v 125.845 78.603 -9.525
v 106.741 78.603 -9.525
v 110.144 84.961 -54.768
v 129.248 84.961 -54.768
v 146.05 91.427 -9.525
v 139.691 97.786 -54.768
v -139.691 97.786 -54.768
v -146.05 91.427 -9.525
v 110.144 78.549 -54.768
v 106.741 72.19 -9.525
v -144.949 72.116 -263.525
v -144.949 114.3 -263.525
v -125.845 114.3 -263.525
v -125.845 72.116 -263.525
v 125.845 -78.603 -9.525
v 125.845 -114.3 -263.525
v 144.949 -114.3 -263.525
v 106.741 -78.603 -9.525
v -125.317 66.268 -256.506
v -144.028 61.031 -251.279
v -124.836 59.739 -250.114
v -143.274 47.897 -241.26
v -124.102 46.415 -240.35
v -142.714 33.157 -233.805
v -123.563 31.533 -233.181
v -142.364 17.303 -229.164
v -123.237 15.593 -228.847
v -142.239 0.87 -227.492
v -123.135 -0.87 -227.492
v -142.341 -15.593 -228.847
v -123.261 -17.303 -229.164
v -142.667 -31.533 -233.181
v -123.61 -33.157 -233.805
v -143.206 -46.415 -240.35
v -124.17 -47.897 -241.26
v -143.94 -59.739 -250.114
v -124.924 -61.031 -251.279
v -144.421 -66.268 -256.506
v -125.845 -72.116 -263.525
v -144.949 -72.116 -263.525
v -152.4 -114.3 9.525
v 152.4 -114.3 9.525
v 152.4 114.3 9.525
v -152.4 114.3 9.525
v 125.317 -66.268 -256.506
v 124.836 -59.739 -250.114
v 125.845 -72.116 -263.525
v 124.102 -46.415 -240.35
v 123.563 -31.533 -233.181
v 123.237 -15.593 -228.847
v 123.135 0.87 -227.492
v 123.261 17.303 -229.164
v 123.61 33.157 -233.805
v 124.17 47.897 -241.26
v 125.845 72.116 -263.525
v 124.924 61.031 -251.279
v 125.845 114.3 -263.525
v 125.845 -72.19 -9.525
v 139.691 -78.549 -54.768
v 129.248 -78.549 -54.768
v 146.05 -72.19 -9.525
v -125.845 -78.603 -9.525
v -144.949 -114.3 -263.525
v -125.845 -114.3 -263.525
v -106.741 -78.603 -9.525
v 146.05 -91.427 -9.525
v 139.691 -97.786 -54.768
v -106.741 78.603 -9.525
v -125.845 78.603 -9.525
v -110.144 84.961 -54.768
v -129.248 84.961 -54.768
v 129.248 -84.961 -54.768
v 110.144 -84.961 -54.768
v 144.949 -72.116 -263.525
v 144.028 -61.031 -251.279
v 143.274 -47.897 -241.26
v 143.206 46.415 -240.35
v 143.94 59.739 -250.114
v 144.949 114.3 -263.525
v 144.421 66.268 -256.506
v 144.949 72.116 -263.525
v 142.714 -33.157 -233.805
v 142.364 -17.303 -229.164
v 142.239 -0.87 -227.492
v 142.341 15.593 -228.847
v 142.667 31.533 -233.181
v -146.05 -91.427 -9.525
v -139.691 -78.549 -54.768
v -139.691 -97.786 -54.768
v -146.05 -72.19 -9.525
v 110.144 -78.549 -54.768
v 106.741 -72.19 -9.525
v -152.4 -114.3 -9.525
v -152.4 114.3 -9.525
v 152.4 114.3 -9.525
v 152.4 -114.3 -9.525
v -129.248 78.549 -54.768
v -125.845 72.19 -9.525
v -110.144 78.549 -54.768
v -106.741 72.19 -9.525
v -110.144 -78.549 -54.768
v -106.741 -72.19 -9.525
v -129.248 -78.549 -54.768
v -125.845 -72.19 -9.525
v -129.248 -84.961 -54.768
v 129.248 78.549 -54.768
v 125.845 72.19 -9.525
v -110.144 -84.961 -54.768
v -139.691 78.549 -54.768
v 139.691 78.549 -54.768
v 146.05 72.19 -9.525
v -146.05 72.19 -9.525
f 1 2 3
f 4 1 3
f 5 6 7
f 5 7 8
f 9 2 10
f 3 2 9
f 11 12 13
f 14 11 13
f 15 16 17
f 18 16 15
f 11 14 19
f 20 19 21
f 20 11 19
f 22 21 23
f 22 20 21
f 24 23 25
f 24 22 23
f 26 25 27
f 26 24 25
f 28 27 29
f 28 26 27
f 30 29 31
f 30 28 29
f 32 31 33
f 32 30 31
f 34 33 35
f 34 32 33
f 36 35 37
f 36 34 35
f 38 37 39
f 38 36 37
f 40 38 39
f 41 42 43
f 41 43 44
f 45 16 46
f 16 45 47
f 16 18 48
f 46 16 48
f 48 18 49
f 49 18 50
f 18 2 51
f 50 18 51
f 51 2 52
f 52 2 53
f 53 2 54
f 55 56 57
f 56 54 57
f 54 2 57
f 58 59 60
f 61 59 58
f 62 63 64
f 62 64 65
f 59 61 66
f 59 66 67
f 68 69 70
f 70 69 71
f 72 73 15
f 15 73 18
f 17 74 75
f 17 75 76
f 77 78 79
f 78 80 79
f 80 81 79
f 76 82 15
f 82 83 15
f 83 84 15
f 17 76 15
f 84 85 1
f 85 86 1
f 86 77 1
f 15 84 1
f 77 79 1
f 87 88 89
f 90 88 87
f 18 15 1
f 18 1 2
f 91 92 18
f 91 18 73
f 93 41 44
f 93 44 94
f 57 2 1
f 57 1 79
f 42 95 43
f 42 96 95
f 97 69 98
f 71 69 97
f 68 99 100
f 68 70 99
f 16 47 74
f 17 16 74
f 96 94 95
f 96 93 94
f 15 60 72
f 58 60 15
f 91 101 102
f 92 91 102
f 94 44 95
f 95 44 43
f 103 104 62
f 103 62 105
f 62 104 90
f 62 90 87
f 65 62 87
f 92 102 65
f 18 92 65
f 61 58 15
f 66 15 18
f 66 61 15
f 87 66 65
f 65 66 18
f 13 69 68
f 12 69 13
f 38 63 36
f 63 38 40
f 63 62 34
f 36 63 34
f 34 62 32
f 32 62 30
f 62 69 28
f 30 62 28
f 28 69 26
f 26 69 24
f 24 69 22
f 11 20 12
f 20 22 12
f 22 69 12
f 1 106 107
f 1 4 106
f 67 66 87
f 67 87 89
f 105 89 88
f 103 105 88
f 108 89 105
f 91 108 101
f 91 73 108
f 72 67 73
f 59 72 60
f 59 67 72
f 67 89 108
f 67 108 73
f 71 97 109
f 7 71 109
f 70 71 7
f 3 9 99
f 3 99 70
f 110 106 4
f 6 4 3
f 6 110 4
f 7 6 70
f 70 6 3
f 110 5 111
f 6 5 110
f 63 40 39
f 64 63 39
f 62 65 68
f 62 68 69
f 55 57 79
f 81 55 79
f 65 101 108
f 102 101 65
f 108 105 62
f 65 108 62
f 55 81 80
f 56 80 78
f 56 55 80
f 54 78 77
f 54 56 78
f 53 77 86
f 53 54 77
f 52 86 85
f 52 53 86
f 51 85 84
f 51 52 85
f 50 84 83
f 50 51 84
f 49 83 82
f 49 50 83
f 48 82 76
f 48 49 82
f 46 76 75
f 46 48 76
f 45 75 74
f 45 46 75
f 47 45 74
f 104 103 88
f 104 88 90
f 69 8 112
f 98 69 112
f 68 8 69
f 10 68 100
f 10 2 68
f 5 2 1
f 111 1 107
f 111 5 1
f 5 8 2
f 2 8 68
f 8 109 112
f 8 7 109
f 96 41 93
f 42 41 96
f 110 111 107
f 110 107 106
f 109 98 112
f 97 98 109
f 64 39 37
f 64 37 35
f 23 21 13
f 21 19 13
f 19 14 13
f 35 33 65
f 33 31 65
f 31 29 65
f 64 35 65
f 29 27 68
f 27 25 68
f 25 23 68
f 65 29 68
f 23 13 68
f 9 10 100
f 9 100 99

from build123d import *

# Parameters (mm, degrees)
F1_DEPTH      = 114.3
F2_DEPTH      = 114.3
F2_DEPTH_BACK = 114.3
F4_DEPTH      = 152.401
F4_DEPTH_BACK = 152.401
F6_DEPTH      = 152.4
F6_DEPTH_BACK = 152.4
F7_DEPTH      = 114.3010000004
F7_DEPTH_BACK = 114.3010000004


with BuildPart() as f1:
    # F0 (on Front) → F1 (new body, symmetric)
    with BuildSketch(Plane.XZ):
        Polygon((152.4, -9.525), (152.4, 9.525), (-152.4, 9.525), (-152.4, -9.525), (-146.05, -9.525), (-125.8450143232, -9.525), (-106.7412091007, -9.525), (106.7412091007, -9.525), (125.8450143232, -9.525), (146.05, -9.525), align=None)
    extrude(amount=F1_DEPTH, both=True)


with BuildPart() as f2:
    # F0 (on Front) → F2 (new body, two sides)
    with BuildSketch(Plane.XZ) as f2_sk:
        Polygon((144.9488195456, -263.525), (129.8880271086, -63.2800103521), (110.7842218861, -63.2800103521), (125.8450143232, -263.525), align=None)
        Polygon((129.8880271086, -63.2800103521), (125.8450143232, -9.525), (106.7412091007, -9.525), (110.7842218861, -63.2800103521), align=None)
    extrude(amount=-F2_DEPTH)
    extrude(f2_sk.sketch, amount=F2_DEPTH_BACK)


with BuildPart() as f2b:
    # F0 (on Front) → F2, piece 2 (new body, two sides)
    with BuildSketch(Plane.XZ) as f2_2_sk:
        Polygon((-106.7412091007, -9.525), (-125.8450143232, -9.525), (-129.8880271086, -63.2800103521), (-110.7842218861, -63.2800103521), align=None)
        Polygon((-110.7842218861, -63.2800103521), (-129.8880271086, -63.2800103521), (-144.9488195456, -263.525), (-125.8450143232, -263.525), align=None)
    extrude(amount=-F2_DEPTH)
    extrude(f2_2_sk.sketch, amount=F2_DEPTH_BACK)


with BuildPart() as f4_tool:
    # F3 (on Right) → F4 (new body, two sides)
    with BuildSketch(Plane.YZ) as f4_sk:
        Polygon((114.3000000002, -9.525), (78.6026279859, -9.525), (114.3000000004, -263.525), align=None)
        with BuildLine():
            ThreePointArc((72.1161812544, -263.525), (0, -227.4881327199), (-72.1161812544, -263.525))
            Line((-72.1161812544, -263.525), (72.1161812544, -263.525))
        make_face()
        Polygon((-114.3, -9.525), (-114.3, -263.525), (-78.6026279859, -9.525), align=None)
    extrude(amount=-F4_DEPTH)
    extrude(f4_sk.sketch, amount=F4_DEPTH_BACK)


with BuildPart() as f2_1:
    add(f2.part)

    # F4: cut by f4_tool
    add(f4_tool.part, mode=Mode.SUBTRACT)


with BuildPart() as f2b_1:
    add(f2b.part)

    # F4: cut by f4_tool
    add(f4_tool.part, mode=Mode.SUBTRACT)


with BuildPart() as f6:
    # F5 (on Right) → F6 (new body, two sides)
    with BuildSketch(Plane.YZ) as f6_sk:
        Polygon((84.961160059, -54.7683065912), (78.6026279859, -9.525), (72.1902229004, -9.525), (78.5487549735, -54.7683065912), align=None)
        Polygon((91.4274381569, -9.525), (78.602627986, -9.525), (84.961160059, -54.7683065912), (97.7859702299, -54.7683065912), align=None)
    extrude(amount=F6_DEPTH)
    extrude(f6_sk.sketch, amount=-F6_DEPTH_BACK)


with BuildPart() as f6b:
    # F5 (on Right) → F6, piece 2 (new body, two sides)
    with BuildSketch(Plane.YZ) as f6_2_sk:
        Polygon((-78.5487549735, -54.7683065912), (-72.1902229004, -9.525), (-78.6026279857, -9.525), (-84.9611600589, -54.7683065912), align=None)
        Polygon((-84.9611600589, -54.7683065912), (-78.6026279859, -9.525), (-91.4274381569, -9.525), (-97.7859702299, -54.7683065912), align=None)
    extrude(amount=F6_DEPTH)
    extrude(f6_2_sk.sketch, amount=-F6_DEPTH_BACK)


with BuildPart() as f7_tool:
    # F0 (on Front) → F7 (new body, two sides)
    with BuildSketch(Plane.XZ) as f7_sk:
        Polygon((-146.05, -9.525), (-152.4, -9.525), (-152.4, -63.2800103521), (-138.4952259757, -63.2800103521), align=None)
        Polygon((152.4, -63.2800103521), (152.4, -9.525), (146.05, -9.525), (138.4952259757, -63.2800103521), align=None)
    extrude(amount=-F7_DEPTH)
    extrude(f7_sk.sketch, amount=F7_DEPTH_BACK)


with BuildPart() as f6_1:
    add(f6.part)

    # F7: cut by f7_tool
    add(f7_tool.part, mode=Mode.SUBTRACT)

    # F8: cut F2b
    add(f2b_1.part, mode=Mode.SUBTRACT)

    # F9: cut F2
    add(f2_1.part, mode=Mode.SUBTRACT)


with BuildPart() as f6b_1:
    add(f6b.part)

    # F7: cut by f7_tool
    add(f7_tool.part, mode=Mode.SUBTRACT)

    # F10: cut F2
    add(f2_1.part, mode=Mode.SUBTRACT)

    # F11: cut F2b
    add(f2b_1.part, mode=Mode.SUBTRACT)


solid = Compound([f1.part, f2_1.part, f2b_1.part, f6_1.part, f6b_1.part])
